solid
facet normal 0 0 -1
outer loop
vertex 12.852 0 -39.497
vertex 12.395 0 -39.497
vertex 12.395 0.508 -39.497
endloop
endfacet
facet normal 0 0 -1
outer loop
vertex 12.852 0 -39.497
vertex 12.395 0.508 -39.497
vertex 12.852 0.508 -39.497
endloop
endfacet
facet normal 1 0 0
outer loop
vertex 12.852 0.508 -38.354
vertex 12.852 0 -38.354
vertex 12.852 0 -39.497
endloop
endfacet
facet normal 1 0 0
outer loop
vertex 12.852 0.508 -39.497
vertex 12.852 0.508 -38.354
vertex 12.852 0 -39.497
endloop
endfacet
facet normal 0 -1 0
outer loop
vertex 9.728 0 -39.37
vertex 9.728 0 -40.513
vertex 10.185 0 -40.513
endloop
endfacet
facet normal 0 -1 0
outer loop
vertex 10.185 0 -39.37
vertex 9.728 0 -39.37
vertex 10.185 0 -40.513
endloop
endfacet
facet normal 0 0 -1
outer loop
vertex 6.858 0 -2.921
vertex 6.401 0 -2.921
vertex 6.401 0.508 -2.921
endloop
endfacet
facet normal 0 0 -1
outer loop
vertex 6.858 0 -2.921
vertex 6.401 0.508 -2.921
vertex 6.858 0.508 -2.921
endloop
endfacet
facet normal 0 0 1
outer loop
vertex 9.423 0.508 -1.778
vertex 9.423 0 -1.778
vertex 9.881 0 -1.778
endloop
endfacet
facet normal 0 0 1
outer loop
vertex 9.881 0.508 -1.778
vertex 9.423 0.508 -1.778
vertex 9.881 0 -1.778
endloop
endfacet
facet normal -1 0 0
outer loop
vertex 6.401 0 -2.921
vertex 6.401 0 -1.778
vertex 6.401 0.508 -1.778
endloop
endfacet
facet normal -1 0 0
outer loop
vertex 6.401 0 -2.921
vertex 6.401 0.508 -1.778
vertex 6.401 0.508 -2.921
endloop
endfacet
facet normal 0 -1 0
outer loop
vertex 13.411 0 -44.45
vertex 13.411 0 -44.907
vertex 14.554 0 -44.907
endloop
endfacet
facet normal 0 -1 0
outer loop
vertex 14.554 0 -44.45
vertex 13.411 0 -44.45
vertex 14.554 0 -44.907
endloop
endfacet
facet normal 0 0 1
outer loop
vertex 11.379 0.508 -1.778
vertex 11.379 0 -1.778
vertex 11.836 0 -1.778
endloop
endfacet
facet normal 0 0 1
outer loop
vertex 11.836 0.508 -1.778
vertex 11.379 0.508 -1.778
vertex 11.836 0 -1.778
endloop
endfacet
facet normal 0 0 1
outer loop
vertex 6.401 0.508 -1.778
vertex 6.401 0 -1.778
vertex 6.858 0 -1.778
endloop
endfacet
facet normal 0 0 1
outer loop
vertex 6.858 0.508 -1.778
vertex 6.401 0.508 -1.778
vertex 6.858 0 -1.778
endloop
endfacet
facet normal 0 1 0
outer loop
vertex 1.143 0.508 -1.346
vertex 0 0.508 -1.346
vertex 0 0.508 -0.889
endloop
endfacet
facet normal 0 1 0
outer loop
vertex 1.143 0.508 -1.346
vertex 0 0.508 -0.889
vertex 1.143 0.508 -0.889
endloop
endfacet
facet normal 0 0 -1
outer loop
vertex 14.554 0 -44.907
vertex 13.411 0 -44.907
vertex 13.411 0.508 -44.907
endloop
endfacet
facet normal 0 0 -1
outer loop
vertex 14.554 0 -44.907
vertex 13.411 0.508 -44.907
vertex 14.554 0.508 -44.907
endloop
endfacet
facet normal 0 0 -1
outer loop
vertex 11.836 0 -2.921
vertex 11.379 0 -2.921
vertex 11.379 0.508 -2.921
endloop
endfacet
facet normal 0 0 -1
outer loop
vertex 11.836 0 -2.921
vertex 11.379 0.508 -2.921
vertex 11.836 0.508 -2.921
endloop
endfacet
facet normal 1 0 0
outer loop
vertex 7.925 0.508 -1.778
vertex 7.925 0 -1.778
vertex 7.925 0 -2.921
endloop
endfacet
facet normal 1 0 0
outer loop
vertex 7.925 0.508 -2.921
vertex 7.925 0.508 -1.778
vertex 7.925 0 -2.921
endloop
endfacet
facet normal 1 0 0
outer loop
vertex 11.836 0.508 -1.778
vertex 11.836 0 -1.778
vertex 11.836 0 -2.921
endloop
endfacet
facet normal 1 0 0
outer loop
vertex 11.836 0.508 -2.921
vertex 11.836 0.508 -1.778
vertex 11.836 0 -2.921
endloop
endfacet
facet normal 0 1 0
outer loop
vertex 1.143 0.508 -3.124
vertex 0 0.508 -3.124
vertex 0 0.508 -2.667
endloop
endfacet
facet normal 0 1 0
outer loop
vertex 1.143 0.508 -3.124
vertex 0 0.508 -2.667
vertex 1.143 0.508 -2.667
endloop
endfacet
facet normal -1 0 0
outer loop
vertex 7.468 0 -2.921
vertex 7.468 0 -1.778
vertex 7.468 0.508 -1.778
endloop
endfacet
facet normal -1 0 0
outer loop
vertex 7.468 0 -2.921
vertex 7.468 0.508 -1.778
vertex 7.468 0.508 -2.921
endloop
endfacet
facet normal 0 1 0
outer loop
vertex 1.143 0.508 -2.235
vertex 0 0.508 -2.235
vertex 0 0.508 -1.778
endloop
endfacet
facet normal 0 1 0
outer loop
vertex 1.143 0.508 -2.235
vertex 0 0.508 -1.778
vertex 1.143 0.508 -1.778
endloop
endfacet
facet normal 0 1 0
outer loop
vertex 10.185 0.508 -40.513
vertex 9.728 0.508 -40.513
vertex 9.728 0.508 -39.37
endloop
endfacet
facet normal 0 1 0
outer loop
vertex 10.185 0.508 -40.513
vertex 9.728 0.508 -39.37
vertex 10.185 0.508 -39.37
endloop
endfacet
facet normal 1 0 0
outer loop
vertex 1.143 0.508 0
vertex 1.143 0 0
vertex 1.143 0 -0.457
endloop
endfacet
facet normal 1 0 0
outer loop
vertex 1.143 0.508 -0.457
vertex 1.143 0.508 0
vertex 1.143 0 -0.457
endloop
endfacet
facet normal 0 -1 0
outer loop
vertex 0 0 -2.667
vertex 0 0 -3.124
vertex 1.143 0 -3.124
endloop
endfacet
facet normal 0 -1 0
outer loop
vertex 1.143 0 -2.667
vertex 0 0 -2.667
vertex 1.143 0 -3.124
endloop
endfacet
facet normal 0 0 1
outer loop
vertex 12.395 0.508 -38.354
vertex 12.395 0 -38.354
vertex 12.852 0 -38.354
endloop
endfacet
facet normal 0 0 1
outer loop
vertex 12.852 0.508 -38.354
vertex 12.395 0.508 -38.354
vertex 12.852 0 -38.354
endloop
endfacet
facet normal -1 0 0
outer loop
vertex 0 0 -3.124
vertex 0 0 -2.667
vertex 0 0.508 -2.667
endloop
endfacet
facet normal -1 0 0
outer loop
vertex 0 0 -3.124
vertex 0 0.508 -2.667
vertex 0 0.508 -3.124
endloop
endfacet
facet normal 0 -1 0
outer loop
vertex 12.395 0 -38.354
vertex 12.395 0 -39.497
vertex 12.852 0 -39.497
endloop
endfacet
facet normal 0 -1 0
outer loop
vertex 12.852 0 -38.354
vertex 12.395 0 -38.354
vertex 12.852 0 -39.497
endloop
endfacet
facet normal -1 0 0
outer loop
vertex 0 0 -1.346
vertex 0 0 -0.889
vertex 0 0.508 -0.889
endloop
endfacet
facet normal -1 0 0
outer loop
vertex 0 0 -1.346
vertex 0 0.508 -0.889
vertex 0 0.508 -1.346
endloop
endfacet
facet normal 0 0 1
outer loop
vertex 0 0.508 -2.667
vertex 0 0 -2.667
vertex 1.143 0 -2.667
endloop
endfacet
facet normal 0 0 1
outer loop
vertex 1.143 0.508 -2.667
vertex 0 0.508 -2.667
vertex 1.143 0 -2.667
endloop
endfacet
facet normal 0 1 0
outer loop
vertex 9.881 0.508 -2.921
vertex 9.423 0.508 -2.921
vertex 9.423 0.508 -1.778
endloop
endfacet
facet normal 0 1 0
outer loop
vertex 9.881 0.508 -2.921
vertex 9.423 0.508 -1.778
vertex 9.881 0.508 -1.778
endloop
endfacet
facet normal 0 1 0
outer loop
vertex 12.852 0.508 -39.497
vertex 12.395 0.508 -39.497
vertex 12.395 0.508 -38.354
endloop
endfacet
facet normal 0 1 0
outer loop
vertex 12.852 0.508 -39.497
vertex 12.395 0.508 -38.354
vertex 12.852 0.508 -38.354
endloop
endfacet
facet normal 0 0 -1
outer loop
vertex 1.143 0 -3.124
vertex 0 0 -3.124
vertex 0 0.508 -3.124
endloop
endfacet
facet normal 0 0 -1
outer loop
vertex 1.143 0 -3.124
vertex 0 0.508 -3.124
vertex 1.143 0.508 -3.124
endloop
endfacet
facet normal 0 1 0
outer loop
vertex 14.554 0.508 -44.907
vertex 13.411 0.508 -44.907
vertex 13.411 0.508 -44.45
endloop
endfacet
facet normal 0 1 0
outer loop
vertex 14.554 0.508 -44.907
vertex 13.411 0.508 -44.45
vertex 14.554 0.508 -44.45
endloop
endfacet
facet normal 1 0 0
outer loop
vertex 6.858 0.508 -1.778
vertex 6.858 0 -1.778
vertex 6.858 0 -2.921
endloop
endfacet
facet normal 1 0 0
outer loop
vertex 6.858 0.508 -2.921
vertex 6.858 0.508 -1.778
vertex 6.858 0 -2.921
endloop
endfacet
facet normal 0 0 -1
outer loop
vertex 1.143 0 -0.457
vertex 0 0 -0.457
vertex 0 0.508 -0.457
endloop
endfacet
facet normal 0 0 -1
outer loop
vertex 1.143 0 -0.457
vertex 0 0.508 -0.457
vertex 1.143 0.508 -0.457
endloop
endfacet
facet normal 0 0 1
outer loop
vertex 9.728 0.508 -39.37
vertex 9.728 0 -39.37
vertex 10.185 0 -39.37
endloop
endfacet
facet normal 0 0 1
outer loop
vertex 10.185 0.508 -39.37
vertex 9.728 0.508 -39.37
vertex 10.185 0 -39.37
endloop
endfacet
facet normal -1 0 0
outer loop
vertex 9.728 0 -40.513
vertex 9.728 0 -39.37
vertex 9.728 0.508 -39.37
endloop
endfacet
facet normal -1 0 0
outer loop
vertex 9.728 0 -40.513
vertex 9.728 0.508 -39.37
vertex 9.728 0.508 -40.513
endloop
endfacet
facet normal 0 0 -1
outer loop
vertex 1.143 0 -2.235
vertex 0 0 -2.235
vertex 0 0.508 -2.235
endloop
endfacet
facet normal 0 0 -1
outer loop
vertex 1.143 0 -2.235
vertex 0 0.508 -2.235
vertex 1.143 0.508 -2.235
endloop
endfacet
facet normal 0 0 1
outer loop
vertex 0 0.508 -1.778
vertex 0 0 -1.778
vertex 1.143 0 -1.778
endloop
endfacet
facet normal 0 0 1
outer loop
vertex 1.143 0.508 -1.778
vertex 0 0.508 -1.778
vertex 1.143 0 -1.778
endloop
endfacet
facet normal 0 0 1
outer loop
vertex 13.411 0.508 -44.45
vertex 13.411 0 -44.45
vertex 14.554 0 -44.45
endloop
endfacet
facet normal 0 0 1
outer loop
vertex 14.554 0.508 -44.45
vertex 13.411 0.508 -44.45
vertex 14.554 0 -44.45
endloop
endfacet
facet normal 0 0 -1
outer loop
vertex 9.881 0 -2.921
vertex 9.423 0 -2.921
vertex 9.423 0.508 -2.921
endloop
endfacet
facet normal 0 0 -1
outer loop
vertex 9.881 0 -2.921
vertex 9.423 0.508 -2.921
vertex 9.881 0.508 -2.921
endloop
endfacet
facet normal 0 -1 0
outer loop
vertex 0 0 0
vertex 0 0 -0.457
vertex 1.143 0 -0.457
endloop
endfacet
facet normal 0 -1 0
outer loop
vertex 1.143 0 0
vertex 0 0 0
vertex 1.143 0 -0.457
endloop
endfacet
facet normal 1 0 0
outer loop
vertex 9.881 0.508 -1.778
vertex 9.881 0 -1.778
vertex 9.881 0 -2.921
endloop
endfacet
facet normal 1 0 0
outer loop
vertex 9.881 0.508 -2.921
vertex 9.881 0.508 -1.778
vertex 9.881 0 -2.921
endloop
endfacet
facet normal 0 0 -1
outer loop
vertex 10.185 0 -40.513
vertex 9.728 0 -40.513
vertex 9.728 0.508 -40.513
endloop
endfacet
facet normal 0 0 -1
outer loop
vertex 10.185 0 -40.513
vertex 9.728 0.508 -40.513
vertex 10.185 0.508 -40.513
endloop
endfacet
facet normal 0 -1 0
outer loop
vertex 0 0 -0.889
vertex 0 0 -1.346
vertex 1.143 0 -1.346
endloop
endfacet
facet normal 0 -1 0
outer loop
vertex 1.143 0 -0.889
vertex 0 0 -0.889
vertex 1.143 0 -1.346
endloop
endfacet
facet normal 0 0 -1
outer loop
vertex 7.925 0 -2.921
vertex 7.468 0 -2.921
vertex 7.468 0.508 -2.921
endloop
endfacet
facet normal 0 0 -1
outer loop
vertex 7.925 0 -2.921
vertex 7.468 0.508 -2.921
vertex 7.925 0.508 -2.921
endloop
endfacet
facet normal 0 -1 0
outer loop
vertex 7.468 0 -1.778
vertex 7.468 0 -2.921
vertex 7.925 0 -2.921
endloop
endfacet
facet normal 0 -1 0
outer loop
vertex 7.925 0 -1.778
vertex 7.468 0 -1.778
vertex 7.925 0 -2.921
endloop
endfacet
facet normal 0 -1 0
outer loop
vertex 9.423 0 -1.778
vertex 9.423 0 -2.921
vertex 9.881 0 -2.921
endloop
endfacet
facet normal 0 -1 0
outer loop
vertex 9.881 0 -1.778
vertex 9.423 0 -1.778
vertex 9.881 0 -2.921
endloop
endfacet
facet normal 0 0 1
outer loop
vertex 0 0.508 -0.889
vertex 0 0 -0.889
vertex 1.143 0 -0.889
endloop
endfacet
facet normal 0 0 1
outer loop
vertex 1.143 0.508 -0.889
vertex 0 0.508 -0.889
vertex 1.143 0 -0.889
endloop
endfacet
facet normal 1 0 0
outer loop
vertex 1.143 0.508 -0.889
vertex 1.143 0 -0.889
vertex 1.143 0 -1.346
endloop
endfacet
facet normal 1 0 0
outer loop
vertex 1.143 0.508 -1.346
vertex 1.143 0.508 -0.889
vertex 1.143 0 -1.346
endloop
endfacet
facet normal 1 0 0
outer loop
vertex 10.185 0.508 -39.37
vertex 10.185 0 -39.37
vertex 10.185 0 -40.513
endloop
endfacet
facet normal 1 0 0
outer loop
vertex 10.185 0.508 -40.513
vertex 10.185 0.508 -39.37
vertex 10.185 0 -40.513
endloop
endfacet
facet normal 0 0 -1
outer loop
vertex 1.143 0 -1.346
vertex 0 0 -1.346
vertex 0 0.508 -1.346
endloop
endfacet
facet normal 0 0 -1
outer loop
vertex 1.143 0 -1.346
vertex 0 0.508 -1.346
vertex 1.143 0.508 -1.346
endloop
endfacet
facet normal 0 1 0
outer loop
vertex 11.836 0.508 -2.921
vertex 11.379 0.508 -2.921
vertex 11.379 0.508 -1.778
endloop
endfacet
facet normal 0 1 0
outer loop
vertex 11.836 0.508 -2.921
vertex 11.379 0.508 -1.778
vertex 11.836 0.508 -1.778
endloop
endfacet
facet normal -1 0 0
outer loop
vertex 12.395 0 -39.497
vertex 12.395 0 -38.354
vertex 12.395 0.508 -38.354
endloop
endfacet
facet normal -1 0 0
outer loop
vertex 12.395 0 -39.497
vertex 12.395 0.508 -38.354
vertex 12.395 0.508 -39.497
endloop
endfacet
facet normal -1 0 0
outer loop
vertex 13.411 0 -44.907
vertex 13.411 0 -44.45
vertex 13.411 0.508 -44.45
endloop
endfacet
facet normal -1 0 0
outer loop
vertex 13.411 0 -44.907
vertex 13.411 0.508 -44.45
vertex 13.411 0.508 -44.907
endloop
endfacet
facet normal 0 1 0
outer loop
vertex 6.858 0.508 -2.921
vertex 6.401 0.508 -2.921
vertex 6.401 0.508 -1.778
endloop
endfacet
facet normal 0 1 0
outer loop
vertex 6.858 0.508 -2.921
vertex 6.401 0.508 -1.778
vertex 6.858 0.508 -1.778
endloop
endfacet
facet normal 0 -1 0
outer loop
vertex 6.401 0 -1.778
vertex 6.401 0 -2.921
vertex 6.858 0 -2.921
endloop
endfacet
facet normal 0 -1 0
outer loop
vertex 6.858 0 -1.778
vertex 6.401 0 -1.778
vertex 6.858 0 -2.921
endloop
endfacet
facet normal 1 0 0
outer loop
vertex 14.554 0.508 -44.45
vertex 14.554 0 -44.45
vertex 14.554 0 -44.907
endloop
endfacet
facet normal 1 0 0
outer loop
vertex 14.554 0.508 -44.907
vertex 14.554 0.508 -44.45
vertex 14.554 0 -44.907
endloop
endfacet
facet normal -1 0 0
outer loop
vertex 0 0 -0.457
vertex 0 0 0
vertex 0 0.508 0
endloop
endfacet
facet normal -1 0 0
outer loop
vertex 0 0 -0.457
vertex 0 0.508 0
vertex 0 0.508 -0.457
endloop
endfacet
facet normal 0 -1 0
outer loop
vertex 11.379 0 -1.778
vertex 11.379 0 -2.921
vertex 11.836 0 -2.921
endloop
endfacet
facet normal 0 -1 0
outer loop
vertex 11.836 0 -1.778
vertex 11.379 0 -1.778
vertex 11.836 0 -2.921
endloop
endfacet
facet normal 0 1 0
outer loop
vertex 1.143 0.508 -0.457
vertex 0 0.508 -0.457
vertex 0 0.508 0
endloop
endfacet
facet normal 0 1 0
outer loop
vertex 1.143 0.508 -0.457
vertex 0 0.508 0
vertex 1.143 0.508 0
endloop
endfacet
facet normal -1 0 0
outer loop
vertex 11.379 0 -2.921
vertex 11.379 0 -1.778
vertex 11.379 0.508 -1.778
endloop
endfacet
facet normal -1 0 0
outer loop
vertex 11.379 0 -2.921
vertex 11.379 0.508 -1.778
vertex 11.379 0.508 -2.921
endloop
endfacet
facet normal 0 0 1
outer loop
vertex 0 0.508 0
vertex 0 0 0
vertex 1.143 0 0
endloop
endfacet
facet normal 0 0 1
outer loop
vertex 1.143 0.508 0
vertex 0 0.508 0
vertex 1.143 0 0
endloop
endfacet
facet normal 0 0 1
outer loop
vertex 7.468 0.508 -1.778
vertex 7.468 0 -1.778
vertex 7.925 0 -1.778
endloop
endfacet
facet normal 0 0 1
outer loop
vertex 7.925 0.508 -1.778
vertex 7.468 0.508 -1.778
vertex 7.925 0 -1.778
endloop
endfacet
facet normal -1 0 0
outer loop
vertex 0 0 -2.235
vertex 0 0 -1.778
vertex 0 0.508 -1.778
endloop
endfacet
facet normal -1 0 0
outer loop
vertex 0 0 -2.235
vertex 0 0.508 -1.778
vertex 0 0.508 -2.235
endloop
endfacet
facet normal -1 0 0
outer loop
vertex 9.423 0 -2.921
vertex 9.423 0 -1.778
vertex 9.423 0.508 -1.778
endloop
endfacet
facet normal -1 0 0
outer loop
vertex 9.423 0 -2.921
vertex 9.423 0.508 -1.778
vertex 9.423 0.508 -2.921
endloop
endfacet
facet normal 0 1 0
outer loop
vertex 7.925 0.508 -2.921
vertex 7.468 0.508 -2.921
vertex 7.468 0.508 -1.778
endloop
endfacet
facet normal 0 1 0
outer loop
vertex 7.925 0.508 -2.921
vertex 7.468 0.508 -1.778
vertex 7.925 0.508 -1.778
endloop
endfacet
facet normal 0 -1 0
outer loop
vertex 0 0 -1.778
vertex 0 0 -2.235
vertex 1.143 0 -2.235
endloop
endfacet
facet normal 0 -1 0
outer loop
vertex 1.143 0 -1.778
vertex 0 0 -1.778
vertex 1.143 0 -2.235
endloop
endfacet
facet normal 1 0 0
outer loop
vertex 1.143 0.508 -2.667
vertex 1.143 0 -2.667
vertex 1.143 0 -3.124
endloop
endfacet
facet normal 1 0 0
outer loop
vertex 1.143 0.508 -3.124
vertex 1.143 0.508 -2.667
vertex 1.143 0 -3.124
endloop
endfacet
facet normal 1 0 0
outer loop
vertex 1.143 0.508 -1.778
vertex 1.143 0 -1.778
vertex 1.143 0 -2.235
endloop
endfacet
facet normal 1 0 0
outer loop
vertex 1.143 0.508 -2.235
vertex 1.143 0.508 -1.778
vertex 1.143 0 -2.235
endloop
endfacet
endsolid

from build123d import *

# Parameters (mm, degrees)
SKETCH1_W              = 1.143
SKETCH1_H              = 0.4572
BOSS_EXTRUDE1_DEPTH    = 0.508
BOSS_EXTRUDE1_2_DEPTH  = 0.508
BOSS_EXTRUDE1_3_DEPTH  = 0.508
BOSS_EXTRUDE1_4_DEPTH  = 0.508
SKETCH1_W_2            = 0.4572
SKETCH1_H_2            = 1.143
BOSS_EXTRUDE1_5_DEPTH  = 0.508
BOSS_EXTRUDE1_6_DEPTH  = 0.508
BOSS_EXTRUDE1_7_DEPTH  = 0.508
BOSS_EXTRUDE1_8_DEPTH  = 0.508
BOSS_EXTRUDE1_9_DEPTH  = 0.508
BOSS_EXTRUDE1_10_DEPTH = 0.508
BOSS_EXTRUDE1_11_DEPTH = 0.508


with BuildPart() as part:
    # Sketch1 → Boss-Extrude1 (new body)
    with BuildSketch(Plane(origin=(0, 0, 0), x_dir=(1, 0, 0), z_dir=(0, 1, 0))):
        with Locations((0.5715, 0.2286)):
            Rectangle(SKETCH1_W, SKETCH1_H)
    extrude(amount=BOSS_EXTRUDE1_DEPTH)


with BuildPart() as body_2:
    # Sketch1 → Boss-Extrude1 2 (new body)
    with BuildSketch(Plane(origin=(0, 0, 0), x_dir=(1, 0, 0), z_dir=(0, 1, 0))):
        with Locations((0.5715, 1.1176)):
            Rectangle(SKETCH1_W, SKETCH1_H)
    extrude(amount=BOSS_EXTRUDE1_2_DEPTH)


with BuildPart() as body_3:
    # Sketch1 → Boss-Extrude1 3 (new body)
    with BuildSketch(Plane(origin=(0, 0, 0), x_dir=(1, 0, 0), z_dir=(0, 1, 0))):
        with Locations((0.5715, 2.0066)):
            Rectangle(SKETCH1_W, SKETCH1_H)
    extrude(amount=BOSS_EXTRUDE1_3_DEPTH)


with BuildPart() as body_4:
    # Sketch1 → Boss-Extrude1 4 (new body)
    with BuildSketch(Plane(origin=(0, 0, 0), x_dir=(1, 0, 0), z_dir=(0, 1, 0))):
        with Locations((0.5715, 2.8956)):
            Rectangle(SKETCH1_W, SKETCH1_H)
    extrude(amount=BOSS_EXTRUDE1_4_DEPTH)


with BuildPart() as body_5:
    # Sketch1 → Boss-Extrude1 5 (new body)
    with BuildSketch(Plane(origin=(0, 0, 0), x_dir=(1, 0, 0), z_dir=(0, 1, 0))):
        with Locations((6.6294, 2.3495)):
            Rectangle(SKETCH1_W_2, SKETCH1_H_2)
    extrude(amount=BOSS_EXTRUDE1_5_DEPTH)


with BuildPart() as body_6:
    # Sketch1 → Boss-Extrude1 6 (new body)
    with BuildSketch(Plane(origin=(0, 0, 0), x_dir=(1, 0, 0), z_dir=(0, 1, 0))):
        with Locations((7.6962, 2.3495)):
            Rectangle(SKETCH1_W_2, SKETCH1_H_2)
    extrude(amount=BOSS_EXTRUDE1_6_DEPTH)


with BuildPart() as body_7:
    # Sketch1 → Boss-Extrude1 7 (new body)
    with BuildSketch(Plane(origin=(0, 0, 0), x_dir=(1, 0, 0), z_dir=(0, 1, 0))):
        with Locations((9.652, 2.3495)):
            Rectangle(SKETCH1_W_2, SKETCH1_H_2)
    extrude(amount=BOSS_EXTRUDE1_7_DEPTH)


with BuildPart() as body_8:
    # Sketch1 → Boss-Extrude1 8 (new body)
    with BuildSketch(Plane(origin=(0, 0, 0), x_dir=(1, 0, 0), z_dir=(0, 1, 0))):
        with Locations((11.6078, 2.3495)):
            Rectangle(SKETCH1_W_2, SKETCH1_H_2)
    extrude(amount=BOSS_EXTRUDE1_8_DEPTH)


with BuildPart() as body_9:
    # Sketch1 → Boss-Extrude1 9 (new body)
    with BuildSketch(Plane(origin=(0, 0, 0), x_dir=(1, 0, 0), z_dir=(0, 1, 0))):
        with Locations((9.9568, 39.9415)):
            Rectangle(SKETCH1_W_2, SKETCH1_H_2)
    extrude(amount=BOSS_EXTRUDE1_9_DEPTH)


with BuildPart() as body_10:
    # Sketch1 → Boss-Extrude1 10 (new body)
    with BuildSketch(Plane(origin=(0, 0, 0), x_dir=(1, 0, 0), z_dir=(0, 1, 0))):
        with Locations((12.6238, 38.9255)):
            Rectangle(SKETCH1_W_2, SKETCH1_H_2)
    extrude(amount=BOSS_EXTRUDE1_10_DEPTH)


with BuildPart() as body_11:
    # Sketch1 → Boss-Extrude1 11 (new body)
    with BuildSketch(Plane(origin=(0, 0, 0), x_dir=(1, 0, 0), z_dir=(0, 1, 0))):
        with Locations((13.9827, 44.6786)):
            Rectangle(SKETCH1_W, SKETCH1_H)
    extrude(amount=BOSS_EXTRUDE1_11_DEPTH)


solid = Compound([part.part, body_2.part, body_3.part, body_4.part, body_5.part, body_6.part, body_7.part, body_8.part, body_9.part, body_10.part, body_11.part])
